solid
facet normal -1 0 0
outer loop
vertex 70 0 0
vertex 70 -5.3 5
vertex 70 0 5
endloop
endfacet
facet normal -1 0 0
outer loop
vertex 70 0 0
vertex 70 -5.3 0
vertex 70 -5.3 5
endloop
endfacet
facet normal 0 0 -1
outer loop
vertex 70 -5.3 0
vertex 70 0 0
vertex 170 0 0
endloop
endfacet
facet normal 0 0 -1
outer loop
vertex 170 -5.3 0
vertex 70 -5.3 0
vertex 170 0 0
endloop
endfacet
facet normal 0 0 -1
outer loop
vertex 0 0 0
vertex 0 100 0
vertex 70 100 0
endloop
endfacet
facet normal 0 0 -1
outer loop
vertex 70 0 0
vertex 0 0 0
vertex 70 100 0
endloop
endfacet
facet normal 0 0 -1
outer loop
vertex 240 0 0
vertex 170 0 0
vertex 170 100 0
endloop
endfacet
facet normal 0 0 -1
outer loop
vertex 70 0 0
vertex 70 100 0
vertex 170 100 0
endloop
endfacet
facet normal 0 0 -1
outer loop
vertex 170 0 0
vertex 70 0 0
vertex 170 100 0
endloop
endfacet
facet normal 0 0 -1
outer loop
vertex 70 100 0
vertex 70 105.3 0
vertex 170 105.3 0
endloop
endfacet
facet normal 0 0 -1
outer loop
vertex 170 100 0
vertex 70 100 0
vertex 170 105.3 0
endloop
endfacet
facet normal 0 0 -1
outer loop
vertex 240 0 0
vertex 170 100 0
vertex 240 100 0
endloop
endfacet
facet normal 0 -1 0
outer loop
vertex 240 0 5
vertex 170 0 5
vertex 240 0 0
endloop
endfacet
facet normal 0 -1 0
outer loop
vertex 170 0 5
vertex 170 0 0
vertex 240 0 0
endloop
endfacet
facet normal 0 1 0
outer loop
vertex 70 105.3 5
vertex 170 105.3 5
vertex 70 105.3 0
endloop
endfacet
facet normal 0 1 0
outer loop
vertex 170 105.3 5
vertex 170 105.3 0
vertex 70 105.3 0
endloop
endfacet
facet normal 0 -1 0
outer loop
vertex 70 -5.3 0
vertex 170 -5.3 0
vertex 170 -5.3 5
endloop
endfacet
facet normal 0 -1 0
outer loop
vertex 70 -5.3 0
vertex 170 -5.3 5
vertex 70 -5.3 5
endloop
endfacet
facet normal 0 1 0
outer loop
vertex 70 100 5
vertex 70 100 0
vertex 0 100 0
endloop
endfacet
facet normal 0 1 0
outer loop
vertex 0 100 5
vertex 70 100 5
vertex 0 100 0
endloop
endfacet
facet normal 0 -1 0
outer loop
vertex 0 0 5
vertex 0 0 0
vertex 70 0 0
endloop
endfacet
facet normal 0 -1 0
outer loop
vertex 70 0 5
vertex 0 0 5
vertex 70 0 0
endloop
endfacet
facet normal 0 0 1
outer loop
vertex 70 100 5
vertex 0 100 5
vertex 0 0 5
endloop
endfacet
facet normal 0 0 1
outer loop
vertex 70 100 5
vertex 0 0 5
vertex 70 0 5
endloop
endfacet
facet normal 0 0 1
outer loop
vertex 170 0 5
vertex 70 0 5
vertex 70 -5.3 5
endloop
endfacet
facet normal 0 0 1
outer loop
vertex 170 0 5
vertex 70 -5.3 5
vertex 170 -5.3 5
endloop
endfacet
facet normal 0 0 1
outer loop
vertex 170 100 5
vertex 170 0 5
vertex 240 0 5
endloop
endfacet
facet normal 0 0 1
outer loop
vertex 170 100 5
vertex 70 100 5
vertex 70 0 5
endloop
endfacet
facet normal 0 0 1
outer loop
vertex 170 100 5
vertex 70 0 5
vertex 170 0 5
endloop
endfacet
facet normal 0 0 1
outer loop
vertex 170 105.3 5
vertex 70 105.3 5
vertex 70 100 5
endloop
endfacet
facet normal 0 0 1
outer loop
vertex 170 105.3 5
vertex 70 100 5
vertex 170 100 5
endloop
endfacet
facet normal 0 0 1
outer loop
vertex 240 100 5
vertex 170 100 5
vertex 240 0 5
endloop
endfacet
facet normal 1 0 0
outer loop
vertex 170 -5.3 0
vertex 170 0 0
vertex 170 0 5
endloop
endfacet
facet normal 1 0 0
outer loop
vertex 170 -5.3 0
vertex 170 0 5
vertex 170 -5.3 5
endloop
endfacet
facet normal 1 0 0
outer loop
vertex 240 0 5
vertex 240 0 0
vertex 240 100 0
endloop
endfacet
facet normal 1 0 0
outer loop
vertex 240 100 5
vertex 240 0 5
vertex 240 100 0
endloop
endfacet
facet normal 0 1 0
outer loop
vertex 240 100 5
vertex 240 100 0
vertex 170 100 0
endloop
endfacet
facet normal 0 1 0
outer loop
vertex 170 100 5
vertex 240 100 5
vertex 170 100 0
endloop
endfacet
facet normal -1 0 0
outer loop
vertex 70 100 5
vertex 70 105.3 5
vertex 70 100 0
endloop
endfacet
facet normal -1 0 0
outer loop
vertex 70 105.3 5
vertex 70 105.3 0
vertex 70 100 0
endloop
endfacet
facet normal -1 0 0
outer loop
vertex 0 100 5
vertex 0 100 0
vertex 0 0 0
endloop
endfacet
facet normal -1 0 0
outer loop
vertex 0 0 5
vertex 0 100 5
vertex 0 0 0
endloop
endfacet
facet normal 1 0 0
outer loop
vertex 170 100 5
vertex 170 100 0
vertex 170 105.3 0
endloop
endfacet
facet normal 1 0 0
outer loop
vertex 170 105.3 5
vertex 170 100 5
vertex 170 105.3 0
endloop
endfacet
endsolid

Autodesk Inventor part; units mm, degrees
ref_plane "YZ Plane" through (0, 0, 0) normal (1, 0, 0) x (0, 1, 0)
ref_plane "XZ Plane" through (0, 0, 0) normal (0, 1, 0) x (-1, 0, 0)
ref_plane "XY Plane" through (0, 0, 0) normal (0, 0, 1) x (1, 0, 0)
sketch "Sketch1" plane through (0, 0, 0) normal (0, 0, 1) x (1, 0, 0)
  line L0 (0, 0) -> (240, 0)
  line L1 (240, 0) -> (240, 100)
  line L2 (240, 100) -> (0, 100)
  line L3 (0, 100) -> (0, 0)
  line L4 (70, 0) -> (170, 0)
  line L5 (170, 0) -> (170, -5.3)
  line L6 (170, -5.3) -> (70, -5.3)
  line L7 (70, -5.3) -> (70, 0)
  line L8 (70, 100) -> (170, 100)
  line L9 (170, 100) -> (170, 105.3)
  line L10 (170, 105.3) -> (70, 105.3)
  line L11 (70, 105.3) -> (70, 100)
  point P0 (0, 20)
  point P1 (170, 0)
  dimension "d0" = 240
  dimension "d1" = 100
  dimension "d2" = 100
  dimension "d3" = 5.3
  dimension "d8" = 70
  dimension "d9" = 5.3
extrude "Extrusion1" add sketch "Sketch1" along normal blind 5
properties part number "front"
